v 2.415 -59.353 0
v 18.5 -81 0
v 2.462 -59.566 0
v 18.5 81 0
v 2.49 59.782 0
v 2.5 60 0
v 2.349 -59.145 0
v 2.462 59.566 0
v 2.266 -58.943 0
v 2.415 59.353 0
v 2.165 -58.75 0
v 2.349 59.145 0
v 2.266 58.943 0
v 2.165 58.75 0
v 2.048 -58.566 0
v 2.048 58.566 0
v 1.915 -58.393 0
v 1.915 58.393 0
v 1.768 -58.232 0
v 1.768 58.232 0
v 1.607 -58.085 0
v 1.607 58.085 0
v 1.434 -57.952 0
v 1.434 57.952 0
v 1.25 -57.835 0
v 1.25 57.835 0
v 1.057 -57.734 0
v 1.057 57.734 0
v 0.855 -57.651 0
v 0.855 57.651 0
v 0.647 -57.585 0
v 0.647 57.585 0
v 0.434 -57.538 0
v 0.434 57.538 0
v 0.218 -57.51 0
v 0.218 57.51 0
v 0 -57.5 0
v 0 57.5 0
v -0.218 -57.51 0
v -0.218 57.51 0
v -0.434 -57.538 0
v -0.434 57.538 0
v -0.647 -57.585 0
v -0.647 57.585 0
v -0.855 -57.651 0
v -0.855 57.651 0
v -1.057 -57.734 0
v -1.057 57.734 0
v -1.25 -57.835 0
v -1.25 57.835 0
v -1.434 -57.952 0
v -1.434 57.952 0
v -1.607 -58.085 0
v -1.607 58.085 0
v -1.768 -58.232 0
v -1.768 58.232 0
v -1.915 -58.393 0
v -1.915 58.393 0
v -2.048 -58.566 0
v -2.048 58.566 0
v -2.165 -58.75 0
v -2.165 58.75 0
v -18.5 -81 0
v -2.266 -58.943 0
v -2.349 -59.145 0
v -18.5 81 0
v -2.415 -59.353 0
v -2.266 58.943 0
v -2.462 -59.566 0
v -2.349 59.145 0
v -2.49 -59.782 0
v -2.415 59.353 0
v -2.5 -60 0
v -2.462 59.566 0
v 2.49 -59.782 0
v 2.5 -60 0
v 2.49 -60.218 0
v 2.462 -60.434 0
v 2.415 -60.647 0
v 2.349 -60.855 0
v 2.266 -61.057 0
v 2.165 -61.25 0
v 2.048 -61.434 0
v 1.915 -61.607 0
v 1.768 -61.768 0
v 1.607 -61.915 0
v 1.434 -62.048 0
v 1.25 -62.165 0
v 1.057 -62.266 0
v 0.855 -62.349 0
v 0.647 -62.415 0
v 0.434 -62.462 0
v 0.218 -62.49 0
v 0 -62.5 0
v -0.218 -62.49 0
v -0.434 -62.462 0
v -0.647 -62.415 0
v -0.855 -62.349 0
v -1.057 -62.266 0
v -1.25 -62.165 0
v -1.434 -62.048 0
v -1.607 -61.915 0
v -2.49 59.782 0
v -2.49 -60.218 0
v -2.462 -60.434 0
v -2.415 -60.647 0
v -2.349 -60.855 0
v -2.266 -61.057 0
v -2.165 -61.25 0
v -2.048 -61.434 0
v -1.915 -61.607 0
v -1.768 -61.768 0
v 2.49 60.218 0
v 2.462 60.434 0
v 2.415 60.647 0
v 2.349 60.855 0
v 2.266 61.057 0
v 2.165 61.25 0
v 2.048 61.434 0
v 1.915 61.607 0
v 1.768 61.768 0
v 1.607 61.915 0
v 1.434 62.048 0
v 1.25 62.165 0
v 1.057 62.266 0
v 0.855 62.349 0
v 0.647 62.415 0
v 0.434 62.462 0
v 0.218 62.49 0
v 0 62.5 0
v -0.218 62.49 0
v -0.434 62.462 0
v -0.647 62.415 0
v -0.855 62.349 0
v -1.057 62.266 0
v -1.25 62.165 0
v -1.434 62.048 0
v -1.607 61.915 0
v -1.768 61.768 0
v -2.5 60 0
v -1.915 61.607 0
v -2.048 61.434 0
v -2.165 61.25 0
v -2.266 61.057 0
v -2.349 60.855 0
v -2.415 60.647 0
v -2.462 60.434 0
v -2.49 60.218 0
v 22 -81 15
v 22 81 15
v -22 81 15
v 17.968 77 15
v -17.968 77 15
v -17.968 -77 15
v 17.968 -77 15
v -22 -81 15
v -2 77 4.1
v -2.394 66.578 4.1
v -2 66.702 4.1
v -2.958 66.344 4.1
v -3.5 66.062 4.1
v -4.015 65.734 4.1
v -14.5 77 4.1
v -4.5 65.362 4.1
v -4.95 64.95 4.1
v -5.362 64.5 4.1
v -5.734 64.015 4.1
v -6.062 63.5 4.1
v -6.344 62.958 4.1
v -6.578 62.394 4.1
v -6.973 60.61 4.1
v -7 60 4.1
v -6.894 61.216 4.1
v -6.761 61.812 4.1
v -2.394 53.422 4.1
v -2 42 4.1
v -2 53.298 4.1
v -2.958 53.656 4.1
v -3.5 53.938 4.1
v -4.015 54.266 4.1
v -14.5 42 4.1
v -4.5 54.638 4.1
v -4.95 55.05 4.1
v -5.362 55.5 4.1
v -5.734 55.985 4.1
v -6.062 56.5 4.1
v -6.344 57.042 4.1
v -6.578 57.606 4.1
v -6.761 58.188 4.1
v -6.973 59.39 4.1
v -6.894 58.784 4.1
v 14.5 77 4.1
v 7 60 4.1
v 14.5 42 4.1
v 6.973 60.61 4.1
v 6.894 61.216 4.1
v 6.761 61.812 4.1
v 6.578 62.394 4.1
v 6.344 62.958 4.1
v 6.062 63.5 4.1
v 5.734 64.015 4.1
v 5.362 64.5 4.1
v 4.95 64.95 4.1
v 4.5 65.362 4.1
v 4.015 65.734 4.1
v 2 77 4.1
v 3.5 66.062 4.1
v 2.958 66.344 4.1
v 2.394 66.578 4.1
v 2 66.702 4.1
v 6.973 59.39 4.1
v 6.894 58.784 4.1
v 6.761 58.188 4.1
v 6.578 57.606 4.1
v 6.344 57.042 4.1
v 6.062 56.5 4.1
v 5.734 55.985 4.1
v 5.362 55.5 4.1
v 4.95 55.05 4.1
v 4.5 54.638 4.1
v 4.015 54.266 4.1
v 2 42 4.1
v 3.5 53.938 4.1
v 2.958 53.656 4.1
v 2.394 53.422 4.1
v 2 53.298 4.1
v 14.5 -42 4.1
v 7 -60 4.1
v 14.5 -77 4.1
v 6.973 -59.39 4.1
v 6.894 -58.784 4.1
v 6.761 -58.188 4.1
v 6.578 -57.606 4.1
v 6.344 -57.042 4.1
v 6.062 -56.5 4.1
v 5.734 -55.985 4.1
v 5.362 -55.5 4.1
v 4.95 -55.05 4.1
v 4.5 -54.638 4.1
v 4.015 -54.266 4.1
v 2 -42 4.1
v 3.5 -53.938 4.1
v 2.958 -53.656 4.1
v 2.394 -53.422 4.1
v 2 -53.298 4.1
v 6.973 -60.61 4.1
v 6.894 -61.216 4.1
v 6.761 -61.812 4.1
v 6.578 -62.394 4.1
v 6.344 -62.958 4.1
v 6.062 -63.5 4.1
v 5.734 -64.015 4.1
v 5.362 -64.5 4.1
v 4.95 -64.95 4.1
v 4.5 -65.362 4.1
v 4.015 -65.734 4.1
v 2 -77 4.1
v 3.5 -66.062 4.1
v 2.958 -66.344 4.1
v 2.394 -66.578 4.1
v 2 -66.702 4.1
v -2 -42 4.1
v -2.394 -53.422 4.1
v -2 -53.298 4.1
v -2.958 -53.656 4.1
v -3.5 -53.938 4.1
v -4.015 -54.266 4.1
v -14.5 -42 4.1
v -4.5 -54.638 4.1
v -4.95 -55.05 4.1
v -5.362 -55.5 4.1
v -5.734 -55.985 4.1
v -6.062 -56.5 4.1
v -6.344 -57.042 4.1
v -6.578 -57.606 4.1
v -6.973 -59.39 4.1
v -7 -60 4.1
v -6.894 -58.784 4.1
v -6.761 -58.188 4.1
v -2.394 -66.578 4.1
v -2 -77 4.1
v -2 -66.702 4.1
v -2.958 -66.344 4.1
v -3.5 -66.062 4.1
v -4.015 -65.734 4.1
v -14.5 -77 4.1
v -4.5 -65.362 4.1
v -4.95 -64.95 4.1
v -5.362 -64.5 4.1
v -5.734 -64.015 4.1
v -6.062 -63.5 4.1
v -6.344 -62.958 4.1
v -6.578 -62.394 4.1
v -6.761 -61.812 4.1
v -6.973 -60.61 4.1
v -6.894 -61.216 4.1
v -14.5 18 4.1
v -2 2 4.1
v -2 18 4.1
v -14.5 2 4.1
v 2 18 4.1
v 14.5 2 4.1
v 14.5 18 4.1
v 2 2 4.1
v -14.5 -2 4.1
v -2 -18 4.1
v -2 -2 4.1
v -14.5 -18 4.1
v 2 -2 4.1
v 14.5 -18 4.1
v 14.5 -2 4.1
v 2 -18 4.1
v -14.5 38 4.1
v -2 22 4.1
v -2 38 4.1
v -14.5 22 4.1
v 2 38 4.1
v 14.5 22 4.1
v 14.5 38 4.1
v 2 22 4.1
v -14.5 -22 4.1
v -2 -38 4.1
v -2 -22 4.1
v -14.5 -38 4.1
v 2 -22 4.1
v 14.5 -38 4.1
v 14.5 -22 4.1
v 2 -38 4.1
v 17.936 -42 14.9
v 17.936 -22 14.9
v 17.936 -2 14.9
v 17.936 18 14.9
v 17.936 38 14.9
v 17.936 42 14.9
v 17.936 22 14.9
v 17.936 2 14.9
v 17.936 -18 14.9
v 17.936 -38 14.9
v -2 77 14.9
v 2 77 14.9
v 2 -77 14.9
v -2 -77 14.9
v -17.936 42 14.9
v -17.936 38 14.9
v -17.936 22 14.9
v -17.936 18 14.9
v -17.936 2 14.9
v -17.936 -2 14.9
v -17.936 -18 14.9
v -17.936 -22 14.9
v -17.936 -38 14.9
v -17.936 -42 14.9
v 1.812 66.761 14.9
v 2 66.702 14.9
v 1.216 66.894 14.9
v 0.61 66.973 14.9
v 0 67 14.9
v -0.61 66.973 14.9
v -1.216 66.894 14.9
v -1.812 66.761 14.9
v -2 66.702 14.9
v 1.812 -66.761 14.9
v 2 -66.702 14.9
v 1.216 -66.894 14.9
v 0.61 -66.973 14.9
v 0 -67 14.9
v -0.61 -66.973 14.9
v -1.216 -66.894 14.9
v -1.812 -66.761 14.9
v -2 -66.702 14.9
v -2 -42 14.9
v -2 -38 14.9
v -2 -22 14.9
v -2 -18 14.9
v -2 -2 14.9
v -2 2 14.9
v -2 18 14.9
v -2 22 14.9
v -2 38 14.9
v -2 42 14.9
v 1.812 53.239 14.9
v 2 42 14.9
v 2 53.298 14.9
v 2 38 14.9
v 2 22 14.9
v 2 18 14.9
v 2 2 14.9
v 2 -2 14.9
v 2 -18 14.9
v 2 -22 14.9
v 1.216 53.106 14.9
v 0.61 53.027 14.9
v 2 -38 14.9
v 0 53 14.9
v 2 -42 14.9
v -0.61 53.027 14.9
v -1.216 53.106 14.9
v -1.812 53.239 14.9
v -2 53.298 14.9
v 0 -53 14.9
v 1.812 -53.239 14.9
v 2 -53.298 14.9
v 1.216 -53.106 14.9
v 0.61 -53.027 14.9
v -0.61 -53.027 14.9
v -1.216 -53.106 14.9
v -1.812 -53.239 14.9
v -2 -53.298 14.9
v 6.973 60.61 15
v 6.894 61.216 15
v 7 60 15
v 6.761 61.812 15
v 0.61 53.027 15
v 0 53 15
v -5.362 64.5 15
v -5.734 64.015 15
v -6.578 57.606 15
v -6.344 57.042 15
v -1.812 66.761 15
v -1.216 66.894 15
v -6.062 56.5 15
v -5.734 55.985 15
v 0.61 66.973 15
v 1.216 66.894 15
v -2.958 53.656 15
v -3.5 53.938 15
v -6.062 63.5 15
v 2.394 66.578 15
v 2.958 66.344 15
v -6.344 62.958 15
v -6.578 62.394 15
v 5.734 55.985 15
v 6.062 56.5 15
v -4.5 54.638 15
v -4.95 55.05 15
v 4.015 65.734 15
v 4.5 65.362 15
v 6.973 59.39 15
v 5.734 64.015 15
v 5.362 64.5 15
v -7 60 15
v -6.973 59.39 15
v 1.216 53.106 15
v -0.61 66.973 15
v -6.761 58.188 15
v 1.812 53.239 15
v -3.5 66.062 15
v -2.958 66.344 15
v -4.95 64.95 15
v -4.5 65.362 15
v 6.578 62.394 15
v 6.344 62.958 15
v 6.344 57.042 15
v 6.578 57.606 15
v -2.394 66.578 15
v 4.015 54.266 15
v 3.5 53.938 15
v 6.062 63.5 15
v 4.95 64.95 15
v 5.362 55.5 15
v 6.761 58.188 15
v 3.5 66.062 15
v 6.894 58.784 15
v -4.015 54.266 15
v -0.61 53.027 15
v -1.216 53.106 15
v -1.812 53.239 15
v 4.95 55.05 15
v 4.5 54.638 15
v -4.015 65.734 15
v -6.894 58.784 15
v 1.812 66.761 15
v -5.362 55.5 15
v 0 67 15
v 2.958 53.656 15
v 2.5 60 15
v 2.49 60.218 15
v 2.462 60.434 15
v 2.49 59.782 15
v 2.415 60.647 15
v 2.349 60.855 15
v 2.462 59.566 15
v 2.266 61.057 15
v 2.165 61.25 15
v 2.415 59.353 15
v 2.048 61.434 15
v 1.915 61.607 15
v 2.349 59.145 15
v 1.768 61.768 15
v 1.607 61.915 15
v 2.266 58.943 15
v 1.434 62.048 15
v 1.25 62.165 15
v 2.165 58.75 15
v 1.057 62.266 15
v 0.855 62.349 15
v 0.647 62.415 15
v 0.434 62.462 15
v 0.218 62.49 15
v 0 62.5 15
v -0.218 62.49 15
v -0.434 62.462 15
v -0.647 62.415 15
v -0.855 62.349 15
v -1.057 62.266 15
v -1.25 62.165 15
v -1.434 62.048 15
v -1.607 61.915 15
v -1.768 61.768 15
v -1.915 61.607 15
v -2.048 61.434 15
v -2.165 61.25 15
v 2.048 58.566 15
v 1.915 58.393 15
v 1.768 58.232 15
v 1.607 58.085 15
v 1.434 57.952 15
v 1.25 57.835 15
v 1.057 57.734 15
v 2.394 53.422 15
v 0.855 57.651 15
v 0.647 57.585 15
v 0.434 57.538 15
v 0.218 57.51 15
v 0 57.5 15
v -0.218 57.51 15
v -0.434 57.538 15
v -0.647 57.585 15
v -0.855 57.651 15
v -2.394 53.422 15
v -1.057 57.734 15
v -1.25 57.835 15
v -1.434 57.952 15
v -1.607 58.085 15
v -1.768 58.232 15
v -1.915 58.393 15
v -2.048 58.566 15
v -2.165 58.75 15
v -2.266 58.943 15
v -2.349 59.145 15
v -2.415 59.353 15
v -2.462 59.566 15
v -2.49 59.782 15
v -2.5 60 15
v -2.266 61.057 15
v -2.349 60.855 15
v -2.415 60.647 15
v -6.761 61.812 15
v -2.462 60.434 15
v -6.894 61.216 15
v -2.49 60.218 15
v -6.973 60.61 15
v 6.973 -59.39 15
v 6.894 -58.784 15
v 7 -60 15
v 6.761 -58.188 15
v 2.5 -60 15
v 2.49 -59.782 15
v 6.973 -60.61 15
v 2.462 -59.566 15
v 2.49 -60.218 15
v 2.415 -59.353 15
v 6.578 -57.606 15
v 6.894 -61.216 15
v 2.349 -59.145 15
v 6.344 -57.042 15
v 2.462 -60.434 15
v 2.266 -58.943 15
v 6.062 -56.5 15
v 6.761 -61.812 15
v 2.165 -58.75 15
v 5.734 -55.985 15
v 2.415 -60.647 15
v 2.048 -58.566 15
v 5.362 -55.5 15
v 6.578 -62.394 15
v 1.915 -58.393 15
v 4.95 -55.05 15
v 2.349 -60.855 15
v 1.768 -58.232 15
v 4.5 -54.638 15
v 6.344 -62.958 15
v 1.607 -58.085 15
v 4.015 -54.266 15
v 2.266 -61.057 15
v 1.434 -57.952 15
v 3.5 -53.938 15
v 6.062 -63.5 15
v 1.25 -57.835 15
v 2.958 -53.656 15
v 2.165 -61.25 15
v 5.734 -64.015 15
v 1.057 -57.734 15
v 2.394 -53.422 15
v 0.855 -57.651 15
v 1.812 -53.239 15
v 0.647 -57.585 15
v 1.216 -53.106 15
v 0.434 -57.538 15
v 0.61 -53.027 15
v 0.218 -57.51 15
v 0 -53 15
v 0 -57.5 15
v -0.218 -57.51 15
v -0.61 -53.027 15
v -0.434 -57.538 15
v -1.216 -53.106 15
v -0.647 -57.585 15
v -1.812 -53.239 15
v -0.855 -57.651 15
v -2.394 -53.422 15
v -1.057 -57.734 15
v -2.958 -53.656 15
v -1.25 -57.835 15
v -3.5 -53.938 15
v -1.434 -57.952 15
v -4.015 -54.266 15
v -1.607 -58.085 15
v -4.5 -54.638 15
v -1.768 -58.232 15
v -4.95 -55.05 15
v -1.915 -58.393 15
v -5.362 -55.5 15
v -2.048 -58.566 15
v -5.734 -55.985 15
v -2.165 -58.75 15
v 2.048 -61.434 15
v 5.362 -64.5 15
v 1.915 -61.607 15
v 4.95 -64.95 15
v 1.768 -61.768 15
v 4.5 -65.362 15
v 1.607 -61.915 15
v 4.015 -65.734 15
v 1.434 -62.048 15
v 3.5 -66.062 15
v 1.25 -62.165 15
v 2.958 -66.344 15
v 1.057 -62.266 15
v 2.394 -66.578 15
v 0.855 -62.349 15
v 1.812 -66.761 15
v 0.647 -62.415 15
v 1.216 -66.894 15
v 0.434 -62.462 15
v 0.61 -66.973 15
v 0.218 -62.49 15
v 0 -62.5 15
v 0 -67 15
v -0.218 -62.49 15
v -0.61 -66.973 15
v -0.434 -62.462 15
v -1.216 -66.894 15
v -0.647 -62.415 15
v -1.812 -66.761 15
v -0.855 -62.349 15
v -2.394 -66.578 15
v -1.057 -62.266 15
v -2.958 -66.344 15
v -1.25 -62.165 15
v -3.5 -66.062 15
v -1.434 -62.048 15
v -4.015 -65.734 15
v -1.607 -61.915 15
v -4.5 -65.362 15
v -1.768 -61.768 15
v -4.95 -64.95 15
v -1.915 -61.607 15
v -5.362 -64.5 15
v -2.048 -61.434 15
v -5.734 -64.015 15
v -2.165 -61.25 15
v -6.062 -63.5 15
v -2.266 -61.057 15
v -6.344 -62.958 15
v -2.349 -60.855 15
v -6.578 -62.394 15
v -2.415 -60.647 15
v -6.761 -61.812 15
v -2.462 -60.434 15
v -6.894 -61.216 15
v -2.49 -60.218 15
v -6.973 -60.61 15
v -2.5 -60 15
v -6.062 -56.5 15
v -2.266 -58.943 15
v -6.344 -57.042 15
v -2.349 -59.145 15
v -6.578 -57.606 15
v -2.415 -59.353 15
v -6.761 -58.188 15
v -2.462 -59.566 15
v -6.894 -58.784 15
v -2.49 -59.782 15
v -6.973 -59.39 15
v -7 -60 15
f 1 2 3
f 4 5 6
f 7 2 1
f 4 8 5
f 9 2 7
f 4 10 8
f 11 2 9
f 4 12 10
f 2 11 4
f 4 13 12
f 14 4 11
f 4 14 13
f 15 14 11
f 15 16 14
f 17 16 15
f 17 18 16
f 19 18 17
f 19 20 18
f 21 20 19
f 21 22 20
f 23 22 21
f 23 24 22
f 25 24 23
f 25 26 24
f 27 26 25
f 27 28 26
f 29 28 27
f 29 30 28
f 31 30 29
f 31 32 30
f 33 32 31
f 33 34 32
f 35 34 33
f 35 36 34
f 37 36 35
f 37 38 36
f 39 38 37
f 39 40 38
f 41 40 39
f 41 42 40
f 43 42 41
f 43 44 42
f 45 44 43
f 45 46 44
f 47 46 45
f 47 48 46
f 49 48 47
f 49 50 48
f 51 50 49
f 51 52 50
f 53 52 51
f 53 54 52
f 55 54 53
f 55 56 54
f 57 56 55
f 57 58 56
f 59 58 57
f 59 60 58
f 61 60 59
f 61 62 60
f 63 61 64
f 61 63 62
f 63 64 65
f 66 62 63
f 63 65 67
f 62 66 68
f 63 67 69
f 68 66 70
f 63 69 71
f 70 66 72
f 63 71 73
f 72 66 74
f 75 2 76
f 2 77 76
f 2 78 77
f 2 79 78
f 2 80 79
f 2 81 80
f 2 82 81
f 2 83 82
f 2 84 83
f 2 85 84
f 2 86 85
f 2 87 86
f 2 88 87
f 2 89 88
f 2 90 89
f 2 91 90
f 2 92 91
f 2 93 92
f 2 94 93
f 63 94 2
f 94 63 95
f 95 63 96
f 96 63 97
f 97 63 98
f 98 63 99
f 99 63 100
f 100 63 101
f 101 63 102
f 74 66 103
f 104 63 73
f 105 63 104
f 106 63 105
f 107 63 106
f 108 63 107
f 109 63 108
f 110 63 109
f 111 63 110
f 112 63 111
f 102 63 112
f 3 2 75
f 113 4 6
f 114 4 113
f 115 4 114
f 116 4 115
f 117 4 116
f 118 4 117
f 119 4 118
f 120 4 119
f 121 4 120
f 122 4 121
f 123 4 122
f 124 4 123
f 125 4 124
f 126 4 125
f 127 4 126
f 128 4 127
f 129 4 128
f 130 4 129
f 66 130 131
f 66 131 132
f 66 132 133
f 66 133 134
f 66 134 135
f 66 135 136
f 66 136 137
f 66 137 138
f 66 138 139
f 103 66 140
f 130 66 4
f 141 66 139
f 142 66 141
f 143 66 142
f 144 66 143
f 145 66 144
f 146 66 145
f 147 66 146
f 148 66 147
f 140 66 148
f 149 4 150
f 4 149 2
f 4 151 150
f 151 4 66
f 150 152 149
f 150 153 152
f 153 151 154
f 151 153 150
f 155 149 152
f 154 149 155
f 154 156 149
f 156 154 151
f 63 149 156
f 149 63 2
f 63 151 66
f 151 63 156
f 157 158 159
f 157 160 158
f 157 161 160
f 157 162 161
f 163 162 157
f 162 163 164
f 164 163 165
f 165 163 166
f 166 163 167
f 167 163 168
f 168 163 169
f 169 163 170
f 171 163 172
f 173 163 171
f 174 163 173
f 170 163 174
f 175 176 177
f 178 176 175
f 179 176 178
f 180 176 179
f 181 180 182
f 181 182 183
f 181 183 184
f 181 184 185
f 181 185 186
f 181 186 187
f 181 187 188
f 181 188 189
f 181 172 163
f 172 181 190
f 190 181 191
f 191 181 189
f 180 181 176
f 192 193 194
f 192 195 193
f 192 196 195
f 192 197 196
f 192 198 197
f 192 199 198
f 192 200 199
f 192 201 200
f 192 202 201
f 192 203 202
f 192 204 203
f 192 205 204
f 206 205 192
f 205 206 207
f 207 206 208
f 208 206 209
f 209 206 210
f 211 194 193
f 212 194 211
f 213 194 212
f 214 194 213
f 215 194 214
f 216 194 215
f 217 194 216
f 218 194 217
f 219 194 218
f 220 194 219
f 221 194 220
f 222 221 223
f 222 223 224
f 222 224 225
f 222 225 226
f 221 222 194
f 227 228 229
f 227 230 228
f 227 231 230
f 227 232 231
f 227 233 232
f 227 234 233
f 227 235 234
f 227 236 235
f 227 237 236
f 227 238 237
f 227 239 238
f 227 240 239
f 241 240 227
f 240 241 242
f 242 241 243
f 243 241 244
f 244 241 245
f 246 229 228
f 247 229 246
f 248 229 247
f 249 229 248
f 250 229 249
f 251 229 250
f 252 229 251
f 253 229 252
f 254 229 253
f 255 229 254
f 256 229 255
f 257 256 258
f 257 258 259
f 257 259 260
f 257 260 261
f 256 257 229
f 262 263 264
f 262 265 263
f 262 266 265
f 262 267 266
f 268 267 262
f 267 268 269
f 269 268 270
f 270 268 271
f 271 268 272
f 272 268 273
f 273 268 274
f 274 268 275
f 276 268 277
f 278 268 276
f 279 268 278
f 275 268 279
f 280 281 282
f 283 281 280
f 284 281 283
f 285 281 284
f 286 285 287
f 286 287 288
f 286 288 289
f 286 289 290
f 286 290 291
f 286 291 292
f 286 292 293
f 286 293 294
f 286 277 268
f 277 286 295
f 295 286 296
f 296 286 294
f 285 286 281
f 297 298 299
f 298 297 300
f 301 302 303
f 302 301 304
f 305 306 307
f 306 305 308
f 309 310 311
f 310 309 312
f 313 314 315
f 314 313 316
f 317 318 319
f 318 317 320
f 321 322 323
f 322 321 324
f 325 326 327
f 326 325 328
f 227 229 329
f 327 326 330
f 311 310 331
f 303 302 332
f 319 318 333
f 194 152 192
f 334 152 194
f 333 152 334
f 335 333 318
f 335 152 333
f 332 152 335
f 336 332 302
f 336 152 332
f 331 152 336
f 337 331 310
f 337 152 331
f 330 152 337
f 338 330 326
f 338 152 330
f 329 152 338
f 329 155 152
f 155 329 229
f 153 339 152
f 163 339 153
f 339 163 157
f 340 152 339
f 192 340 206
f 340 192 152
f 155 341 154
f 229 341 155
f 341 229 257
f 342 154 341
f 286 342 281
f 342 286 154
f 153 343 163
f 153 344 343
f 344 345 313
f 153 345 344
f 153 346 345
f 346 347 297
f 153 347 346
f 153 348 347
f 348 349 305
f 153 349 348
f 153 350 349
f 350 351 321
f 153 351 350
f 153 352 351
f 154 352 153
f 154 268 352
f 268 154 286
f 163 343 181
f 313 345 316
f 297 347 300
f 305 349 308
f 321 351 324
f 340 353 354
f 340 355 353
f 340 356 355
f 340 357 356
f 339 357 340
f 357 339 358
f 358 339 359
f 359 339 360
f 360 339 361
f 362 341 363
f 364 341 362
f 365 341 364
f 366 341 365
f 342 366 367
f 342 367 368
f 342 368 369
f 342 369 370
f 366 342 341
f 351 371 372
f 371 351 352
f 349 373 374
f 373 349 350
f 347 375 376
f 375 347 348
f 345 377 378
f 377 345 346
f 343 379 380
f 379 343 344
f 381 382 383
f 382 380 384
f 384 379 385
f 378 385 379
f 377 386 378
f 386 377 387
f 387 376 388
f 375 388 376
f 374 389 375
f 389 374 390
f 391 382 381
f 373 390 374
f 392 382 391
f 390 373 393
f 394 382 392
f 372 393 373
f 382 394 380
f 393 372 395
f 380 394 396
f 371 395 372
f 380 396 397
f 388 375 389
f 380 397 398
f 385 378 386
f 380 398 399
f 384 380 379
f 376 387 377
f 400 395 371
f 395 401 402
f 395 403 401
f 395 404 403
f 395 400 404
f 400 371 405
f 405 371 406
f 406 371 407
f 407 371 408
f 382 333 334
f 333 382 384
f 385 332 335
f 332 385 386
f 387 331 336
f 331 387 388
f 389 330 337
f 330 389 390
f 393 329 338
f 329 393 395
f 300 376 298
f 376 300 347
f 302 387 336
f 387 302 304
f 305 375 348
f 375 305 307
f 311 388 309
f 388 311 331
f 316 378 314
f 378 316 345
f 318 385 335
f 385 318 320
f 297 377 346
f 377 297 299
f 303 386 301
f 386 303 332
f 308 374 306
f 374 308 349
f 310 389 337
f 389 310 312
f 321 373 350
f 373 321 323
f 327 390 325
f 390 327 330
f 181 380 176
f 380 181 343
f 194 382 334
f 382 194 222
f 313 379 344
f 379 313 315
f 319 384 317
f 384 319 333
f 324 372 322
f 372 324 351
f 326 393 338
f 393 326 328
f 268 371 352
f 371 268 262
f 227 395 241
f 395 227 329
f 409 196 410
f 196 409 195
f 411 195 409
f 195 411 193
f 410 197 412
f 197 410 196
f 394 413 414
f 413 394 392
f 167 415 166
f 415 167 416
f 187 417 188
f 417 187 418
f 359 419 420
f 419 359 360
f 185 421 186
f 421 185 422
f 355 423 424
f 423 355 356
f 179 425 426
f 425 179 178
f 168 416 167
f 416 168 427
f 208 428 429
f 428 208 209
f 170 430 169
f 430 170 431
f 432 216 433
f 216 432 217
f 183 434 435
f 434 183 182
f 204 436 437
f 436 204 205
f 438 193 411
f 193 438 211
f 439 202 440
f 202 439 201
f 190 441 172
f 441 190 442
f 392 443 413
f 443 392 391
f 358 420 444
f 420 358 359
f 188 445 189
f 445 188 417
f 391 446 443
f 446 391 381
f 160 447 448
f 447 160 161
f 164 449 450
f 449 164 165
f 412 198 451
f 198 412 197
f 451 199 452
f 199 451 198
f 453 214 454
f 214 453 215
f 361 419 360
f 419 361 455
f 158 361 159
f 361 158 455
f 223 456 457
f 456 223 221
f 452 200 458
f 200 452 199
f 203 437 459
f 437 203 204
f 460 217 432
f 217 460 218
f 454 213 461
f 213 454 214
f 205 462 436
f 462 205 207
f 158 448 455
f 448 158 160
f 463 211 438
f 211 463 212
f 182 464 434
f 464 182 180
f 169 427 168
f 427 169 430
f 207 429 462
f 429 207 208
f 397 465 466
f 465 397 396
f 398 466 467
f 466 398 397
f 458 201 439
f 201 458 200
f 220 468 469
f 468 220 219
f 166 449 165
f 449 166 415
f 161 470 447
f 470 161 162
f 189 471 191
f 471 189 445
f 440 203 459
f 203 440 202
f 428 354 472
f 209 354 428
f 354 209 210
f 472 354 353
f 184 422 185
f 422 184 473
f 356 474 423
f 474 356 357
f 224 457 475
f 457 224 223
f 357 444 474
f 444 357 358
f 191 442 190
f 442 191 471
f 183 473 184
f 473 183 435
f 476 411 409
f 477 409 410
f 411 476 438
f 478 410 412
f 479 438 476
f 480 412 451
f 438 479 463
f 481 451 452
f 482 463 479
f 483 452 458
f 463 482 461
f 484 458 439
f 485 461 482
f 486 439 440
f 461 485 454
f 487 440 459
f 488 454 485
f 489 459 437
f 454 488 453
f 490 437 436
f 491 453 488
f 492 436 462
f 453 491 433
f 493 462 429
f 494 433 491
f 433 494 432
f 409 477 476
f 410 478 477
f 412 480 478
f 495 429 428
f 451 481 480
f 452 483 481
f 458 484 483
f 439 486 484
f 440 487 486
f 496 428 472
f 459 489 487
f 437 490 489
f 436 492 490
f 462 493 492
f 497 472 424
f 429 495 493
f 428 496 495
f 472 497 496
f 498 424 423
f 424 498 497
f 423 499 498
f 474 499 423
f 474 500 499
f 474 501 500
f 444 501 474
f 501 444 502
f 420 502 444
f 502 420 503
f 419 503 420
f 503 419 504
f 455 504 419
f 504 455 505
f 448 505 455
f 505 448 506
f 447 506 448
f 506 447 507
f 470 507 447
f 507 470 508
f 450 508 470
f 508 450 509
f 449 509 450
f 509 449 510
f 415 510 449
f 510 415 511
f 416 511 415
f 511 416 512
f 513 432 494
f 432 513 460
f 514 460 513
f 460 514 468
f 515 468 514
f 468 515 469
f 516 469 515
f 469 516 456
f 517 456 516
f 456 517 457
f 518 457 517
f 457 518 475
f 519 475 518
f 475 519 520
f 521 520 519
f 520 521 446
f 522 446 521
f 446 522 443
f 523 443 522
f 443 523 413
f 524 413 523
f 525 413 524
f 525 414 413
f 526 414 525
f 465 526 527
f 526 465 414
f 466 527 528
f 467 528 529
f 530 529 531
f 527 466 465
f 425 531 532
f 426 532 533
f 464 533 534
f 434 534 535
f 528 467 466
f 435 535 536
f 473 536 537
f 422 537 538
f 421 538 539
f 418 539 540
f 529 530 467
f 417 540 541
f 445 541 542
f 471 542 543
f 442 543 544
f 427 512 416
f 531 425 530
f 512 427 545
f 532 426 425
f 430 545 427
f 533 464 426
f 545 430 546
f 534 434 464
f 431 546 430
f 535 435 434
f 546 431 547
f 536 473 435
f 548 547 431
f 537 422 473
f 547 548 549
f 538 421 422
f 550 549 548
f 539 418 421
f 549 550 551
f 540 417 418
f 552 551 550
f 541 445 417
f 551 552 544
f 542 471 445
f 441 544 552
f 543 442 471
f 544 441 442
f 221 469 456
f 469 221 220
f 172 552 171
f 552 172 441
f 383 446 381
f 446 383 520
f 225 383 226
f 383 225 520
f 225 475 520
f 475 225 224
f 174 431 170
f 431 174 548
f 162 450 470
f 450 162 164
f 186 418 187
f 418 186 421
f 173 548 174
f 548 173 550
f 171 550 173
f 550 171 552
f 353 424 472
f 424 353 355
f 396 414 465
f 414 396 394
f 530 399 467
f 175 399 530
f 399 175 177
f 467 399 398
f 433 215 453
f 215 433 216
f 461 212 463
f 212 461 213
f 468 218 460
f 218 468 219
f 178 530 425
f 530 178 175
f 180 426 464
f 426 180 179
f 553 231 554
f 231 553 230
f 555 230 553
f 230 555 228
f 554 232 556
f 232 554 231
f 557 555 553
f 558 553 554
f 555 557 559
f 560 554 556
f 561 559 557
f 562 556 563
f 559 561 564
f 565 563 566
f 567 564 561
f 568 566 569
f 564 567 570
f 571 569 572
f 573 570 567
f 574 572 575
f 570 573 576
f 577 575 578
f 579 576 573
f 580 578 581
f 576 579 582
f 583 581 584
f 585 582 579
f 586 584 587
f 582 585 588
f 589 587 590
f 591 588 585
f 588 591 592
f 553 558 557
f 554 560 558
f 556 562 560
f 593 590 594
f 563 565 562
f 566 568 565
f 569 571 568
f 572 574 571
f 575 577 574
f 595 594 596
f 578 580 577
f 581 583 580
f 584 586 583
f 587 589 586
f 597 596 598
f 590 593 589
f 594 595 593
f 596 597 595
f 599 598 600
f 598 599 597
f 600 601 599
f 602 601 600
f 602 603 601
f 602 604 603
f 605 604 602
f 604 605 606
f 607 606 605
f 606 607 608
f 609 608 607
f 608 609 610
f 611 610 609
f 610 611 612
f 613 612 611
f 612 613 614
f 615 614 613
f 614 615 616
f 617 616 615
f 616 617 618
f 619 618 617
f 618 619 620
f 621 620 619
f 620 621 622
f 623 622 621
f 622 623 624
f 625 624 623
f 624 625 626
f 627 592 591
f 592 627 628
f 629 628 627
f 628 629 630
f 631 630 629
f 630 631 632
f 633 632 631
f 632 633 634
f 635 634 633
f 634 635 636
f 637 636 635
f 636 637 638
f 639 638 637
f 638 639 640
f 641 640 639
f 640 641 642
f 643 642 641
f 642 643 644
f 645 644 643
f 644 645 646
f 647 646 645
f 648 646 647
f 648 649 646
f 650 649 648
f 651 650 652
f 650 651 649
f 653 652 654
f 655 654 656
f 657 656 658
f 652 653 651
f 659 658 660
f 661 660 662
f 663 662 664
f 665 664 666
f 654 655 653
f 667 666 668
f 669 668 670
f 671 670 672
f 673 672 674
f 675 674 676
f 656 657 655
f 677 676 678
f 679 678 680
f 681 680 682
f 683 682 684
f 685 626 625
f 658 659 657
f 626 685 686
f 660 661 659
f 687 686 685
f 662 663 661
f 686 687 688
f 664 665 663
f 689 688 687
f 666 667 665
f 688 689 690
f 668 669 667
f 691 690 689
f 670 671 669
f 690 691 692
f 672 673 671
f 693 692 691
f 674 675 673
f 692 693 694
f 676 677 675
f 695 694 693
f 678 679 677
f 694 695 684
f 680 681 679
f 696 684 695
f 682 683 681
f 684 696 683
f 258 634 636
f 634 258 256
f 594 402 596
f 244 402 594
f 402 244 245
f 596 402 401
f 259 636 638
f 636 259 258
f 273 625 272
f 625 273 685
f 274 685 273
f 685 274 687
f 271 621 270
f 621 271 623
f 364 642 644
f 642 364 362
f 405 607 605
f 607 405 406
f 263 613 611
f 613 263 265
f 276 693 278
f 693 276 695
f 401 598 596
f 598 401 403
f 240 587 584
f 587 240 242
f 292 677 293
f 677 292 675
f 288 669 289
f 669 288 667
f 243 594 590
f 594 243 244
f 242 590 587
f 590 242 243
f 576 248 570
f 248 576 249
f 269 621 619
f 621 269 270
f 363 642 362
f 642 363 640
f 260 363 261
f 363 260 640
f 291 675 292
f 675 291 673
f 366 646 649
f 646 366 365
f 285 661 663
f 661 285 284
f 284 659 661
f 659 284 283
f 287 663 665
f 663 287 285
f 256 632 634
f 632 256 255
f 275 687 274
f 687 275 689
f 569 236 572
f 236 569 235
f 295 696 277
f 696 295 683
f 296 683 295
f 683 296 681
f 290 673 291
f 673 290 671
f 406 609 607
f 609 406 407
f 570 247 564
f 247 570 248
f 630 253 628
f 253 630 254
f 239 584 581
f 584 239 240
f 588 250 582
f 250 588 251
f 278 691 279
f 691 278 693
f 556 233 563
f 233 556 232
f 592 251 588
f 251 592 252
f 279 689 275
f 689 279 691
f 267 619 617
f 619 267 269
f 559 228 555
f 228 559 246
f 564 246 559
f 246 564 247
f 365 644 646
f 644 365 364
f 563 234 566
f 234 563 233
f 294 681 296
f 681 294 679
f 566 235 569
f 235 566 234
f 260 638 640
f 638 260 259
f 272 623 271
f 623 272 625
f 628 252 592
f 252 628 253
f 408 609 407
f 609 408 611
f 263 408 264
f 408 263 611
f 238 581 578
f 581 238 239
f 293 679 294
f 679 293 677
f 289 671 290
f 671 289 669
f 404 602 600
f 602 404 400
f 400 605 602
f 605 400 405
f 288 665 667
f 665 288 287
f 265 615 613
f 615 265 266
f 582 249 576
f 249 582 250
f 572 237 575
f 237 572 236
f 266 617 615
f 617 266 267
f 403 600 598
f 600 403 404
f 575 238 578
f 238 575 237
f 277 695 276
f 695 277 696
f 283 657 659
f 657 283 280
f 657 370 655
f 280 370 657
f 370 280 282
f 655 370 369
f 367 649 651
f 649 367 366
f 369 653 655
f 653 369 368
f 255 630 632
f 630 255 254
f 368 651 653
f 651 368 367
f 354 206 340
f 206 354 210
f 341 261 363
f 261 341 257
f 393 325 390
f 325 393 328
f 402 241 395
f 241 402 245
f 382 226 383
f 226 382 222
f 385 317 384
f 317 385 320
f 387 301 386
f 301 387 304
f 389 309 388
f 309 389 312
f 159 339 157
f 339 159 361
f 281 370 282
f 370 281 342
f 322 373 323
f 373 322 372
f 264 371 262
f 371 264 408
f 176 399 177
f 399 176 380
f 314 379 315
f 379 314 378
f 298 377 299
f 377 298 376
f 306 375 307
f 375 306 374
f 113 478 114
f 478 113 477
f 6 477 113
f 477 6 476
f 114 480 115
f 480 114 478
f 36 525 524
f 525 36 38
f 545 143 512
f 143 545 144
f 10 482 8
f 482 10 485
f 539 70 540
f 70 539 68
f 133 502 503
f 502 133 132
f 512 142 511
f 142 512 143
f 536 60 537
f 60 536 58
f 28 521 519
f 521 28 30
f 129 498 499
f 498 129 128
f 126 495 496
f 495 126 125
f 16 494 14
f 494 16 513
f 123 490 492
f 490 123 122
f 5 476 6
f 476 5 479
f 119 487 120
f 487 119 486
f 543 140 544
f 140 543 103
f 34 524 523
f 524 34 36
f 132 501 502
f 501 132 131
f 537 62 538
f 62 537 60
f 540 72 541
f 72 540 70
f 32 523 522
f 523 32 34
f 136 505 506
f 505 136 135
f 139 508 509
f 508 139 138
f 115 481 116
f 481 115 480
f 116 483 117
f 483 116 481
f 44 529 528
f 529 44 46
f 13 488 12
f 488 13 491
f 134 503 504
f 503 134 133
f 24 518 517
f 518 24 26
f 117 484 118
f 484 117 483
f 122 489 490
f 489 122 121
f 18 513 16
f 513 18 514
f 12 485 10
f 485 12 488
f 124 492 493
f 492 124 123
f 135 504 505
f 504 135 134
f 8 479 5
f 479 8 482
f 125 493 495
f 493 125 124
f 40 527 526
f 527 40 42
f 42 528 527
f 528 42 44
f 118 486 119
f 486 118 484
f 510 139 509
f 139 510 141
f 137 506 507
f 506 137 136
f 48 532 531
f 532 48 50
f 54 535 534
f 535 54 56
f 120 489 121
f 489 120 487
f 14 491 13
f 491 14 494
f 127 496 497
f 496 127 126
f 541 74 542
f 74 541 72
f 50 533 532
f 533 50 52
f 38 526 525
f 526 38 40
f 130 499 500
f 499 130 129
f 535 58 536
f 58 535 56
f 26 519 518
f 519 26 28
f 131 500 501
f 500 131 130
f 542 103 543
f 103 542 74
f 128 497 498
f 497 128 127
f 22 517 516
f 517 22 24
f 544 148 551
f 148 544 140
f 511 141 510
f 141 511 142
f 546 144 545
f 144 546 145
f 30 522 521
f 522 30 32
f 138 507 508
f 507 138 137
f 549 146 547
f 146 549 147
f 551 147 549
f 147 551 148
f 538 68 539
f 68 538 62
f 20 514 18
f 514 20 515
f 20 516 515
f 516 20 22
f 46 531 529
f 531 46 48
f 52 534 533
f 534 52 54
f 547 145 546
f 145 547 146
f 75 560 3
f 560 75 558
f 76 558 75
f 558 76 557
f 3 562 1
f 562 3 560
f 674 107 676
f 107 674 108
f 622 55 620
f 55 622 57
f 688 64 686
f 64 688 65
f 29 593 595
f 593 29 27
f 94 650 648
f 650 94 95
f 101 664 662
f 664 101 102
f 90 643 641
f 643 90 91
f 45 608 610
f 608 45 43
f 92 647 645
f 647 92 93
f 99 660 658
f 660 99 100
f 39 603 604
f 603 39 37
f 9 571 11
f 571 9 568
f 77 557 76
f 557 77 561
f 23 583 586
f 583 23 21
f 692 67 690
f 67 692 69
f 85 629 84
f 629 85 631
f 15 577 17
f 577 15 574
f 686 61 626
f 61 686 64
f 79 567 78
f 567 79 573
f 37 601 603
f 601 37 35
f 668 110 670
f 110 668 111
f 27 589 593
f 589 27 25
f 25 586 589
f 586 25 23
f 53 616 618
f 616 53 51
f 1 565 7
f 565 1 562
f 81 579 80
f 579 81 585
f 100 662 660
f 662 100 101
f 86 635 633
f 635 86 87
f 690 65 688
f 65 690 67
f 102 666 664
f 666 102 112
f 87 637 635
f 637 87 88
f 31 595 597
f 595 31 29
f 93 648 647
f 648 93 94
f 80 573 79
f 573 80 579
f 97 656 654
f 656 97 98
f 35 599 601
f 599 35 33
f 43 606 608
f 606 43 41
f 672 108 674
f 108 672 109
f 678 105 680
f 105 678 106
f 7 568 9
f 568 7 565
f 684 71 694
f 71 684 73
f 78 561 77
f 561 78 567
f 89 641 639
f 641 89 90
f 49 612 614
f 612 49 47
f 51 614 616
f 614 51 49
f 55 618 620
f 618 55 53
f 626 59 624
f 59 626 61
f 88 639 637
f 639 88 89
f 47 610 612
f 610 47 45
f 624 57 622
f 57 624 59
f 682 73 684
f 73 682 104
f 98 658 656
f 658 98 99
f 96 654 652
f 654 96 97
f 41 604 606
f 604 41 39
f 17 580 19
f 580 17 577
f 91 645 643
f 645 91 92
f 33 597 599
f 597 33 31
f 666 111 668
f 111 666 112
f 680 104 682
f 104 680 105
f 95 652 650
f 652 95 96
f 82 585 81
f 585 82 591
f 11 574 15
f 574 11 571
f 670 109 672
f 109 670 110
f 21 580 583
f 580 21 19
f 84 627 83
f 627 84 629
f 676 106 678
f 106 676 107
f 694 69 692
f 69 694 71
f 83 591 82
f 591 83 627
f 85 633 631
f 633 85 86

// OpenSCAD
// QUEUE D'ARONDE VIXEN 192 MM
// Pierre REVEL 24/3/24
//
// Projet lunette PVC 60 mm DIY
// Queue d'aronde au format VIXEN 192 mm spécifiquement conçue pour
// les colliers pour tubes diamètre 63 et leurs vis de fixation murale

$fn=72;
aju=0.1;

ep=4;
trouvis=5;

// 0 pour version longue, 30 pour version raccourcie (de 30mm)
reduc=30;

module matiere() {
    union() {
      difference() {
        // extérieur de la coque
        translate([-22,0,0]) rotate([90,0,0])
            linear_extrude(height=192-reduc,center=true) polygon(points=[[3.5,0],[0,15],[44,15],[40.5,0]]);
        // intérieur de la coque
        translate([-22,0,aju]) rotate([90,0,0])
            linear_extrude(height=192-reduc-2*ep,center=true) polygon(points=[[3.5+ep,ep],[ep,15],[44-ep,15],[40.5-ep,ep]]);
      }
      // renforts pour les vis des colliers
      translate([0,80-reduc*2/3,0]) cylinder(h=15,r=ep+3);
      translate([0,-80+reduc*2/3,0]) cylinder(h=15,r=ep+3);

      // murs de renfort dans la largeur  
      dz=ep/2+7.5-aju;
      for (y=[0:20:80-reduc]) {
        translate([0,y,dz]) cube([44-2*ep,ep,15-ep],center=true);
        if (y!=0) translate([0,-y,dz]) cube([44-2*ep,ep,15-ep],center=true);
      }
      // mur de renfort dans la longueur  
      translate([0,0,dz]) cube([ep,192-reduc-aju,15-ep],center=true);
    }
}

difference() {
  matiere();
  // TROUS DE DIAMETRE <trouvis>
  translate([0,80-reduc*2/3,-10]) cylinder(h=35,r=trouvis/2);
  translate([0,-80+reduc*2/3,-10]) cylinder(h=35,r=trouvis/2);
}
